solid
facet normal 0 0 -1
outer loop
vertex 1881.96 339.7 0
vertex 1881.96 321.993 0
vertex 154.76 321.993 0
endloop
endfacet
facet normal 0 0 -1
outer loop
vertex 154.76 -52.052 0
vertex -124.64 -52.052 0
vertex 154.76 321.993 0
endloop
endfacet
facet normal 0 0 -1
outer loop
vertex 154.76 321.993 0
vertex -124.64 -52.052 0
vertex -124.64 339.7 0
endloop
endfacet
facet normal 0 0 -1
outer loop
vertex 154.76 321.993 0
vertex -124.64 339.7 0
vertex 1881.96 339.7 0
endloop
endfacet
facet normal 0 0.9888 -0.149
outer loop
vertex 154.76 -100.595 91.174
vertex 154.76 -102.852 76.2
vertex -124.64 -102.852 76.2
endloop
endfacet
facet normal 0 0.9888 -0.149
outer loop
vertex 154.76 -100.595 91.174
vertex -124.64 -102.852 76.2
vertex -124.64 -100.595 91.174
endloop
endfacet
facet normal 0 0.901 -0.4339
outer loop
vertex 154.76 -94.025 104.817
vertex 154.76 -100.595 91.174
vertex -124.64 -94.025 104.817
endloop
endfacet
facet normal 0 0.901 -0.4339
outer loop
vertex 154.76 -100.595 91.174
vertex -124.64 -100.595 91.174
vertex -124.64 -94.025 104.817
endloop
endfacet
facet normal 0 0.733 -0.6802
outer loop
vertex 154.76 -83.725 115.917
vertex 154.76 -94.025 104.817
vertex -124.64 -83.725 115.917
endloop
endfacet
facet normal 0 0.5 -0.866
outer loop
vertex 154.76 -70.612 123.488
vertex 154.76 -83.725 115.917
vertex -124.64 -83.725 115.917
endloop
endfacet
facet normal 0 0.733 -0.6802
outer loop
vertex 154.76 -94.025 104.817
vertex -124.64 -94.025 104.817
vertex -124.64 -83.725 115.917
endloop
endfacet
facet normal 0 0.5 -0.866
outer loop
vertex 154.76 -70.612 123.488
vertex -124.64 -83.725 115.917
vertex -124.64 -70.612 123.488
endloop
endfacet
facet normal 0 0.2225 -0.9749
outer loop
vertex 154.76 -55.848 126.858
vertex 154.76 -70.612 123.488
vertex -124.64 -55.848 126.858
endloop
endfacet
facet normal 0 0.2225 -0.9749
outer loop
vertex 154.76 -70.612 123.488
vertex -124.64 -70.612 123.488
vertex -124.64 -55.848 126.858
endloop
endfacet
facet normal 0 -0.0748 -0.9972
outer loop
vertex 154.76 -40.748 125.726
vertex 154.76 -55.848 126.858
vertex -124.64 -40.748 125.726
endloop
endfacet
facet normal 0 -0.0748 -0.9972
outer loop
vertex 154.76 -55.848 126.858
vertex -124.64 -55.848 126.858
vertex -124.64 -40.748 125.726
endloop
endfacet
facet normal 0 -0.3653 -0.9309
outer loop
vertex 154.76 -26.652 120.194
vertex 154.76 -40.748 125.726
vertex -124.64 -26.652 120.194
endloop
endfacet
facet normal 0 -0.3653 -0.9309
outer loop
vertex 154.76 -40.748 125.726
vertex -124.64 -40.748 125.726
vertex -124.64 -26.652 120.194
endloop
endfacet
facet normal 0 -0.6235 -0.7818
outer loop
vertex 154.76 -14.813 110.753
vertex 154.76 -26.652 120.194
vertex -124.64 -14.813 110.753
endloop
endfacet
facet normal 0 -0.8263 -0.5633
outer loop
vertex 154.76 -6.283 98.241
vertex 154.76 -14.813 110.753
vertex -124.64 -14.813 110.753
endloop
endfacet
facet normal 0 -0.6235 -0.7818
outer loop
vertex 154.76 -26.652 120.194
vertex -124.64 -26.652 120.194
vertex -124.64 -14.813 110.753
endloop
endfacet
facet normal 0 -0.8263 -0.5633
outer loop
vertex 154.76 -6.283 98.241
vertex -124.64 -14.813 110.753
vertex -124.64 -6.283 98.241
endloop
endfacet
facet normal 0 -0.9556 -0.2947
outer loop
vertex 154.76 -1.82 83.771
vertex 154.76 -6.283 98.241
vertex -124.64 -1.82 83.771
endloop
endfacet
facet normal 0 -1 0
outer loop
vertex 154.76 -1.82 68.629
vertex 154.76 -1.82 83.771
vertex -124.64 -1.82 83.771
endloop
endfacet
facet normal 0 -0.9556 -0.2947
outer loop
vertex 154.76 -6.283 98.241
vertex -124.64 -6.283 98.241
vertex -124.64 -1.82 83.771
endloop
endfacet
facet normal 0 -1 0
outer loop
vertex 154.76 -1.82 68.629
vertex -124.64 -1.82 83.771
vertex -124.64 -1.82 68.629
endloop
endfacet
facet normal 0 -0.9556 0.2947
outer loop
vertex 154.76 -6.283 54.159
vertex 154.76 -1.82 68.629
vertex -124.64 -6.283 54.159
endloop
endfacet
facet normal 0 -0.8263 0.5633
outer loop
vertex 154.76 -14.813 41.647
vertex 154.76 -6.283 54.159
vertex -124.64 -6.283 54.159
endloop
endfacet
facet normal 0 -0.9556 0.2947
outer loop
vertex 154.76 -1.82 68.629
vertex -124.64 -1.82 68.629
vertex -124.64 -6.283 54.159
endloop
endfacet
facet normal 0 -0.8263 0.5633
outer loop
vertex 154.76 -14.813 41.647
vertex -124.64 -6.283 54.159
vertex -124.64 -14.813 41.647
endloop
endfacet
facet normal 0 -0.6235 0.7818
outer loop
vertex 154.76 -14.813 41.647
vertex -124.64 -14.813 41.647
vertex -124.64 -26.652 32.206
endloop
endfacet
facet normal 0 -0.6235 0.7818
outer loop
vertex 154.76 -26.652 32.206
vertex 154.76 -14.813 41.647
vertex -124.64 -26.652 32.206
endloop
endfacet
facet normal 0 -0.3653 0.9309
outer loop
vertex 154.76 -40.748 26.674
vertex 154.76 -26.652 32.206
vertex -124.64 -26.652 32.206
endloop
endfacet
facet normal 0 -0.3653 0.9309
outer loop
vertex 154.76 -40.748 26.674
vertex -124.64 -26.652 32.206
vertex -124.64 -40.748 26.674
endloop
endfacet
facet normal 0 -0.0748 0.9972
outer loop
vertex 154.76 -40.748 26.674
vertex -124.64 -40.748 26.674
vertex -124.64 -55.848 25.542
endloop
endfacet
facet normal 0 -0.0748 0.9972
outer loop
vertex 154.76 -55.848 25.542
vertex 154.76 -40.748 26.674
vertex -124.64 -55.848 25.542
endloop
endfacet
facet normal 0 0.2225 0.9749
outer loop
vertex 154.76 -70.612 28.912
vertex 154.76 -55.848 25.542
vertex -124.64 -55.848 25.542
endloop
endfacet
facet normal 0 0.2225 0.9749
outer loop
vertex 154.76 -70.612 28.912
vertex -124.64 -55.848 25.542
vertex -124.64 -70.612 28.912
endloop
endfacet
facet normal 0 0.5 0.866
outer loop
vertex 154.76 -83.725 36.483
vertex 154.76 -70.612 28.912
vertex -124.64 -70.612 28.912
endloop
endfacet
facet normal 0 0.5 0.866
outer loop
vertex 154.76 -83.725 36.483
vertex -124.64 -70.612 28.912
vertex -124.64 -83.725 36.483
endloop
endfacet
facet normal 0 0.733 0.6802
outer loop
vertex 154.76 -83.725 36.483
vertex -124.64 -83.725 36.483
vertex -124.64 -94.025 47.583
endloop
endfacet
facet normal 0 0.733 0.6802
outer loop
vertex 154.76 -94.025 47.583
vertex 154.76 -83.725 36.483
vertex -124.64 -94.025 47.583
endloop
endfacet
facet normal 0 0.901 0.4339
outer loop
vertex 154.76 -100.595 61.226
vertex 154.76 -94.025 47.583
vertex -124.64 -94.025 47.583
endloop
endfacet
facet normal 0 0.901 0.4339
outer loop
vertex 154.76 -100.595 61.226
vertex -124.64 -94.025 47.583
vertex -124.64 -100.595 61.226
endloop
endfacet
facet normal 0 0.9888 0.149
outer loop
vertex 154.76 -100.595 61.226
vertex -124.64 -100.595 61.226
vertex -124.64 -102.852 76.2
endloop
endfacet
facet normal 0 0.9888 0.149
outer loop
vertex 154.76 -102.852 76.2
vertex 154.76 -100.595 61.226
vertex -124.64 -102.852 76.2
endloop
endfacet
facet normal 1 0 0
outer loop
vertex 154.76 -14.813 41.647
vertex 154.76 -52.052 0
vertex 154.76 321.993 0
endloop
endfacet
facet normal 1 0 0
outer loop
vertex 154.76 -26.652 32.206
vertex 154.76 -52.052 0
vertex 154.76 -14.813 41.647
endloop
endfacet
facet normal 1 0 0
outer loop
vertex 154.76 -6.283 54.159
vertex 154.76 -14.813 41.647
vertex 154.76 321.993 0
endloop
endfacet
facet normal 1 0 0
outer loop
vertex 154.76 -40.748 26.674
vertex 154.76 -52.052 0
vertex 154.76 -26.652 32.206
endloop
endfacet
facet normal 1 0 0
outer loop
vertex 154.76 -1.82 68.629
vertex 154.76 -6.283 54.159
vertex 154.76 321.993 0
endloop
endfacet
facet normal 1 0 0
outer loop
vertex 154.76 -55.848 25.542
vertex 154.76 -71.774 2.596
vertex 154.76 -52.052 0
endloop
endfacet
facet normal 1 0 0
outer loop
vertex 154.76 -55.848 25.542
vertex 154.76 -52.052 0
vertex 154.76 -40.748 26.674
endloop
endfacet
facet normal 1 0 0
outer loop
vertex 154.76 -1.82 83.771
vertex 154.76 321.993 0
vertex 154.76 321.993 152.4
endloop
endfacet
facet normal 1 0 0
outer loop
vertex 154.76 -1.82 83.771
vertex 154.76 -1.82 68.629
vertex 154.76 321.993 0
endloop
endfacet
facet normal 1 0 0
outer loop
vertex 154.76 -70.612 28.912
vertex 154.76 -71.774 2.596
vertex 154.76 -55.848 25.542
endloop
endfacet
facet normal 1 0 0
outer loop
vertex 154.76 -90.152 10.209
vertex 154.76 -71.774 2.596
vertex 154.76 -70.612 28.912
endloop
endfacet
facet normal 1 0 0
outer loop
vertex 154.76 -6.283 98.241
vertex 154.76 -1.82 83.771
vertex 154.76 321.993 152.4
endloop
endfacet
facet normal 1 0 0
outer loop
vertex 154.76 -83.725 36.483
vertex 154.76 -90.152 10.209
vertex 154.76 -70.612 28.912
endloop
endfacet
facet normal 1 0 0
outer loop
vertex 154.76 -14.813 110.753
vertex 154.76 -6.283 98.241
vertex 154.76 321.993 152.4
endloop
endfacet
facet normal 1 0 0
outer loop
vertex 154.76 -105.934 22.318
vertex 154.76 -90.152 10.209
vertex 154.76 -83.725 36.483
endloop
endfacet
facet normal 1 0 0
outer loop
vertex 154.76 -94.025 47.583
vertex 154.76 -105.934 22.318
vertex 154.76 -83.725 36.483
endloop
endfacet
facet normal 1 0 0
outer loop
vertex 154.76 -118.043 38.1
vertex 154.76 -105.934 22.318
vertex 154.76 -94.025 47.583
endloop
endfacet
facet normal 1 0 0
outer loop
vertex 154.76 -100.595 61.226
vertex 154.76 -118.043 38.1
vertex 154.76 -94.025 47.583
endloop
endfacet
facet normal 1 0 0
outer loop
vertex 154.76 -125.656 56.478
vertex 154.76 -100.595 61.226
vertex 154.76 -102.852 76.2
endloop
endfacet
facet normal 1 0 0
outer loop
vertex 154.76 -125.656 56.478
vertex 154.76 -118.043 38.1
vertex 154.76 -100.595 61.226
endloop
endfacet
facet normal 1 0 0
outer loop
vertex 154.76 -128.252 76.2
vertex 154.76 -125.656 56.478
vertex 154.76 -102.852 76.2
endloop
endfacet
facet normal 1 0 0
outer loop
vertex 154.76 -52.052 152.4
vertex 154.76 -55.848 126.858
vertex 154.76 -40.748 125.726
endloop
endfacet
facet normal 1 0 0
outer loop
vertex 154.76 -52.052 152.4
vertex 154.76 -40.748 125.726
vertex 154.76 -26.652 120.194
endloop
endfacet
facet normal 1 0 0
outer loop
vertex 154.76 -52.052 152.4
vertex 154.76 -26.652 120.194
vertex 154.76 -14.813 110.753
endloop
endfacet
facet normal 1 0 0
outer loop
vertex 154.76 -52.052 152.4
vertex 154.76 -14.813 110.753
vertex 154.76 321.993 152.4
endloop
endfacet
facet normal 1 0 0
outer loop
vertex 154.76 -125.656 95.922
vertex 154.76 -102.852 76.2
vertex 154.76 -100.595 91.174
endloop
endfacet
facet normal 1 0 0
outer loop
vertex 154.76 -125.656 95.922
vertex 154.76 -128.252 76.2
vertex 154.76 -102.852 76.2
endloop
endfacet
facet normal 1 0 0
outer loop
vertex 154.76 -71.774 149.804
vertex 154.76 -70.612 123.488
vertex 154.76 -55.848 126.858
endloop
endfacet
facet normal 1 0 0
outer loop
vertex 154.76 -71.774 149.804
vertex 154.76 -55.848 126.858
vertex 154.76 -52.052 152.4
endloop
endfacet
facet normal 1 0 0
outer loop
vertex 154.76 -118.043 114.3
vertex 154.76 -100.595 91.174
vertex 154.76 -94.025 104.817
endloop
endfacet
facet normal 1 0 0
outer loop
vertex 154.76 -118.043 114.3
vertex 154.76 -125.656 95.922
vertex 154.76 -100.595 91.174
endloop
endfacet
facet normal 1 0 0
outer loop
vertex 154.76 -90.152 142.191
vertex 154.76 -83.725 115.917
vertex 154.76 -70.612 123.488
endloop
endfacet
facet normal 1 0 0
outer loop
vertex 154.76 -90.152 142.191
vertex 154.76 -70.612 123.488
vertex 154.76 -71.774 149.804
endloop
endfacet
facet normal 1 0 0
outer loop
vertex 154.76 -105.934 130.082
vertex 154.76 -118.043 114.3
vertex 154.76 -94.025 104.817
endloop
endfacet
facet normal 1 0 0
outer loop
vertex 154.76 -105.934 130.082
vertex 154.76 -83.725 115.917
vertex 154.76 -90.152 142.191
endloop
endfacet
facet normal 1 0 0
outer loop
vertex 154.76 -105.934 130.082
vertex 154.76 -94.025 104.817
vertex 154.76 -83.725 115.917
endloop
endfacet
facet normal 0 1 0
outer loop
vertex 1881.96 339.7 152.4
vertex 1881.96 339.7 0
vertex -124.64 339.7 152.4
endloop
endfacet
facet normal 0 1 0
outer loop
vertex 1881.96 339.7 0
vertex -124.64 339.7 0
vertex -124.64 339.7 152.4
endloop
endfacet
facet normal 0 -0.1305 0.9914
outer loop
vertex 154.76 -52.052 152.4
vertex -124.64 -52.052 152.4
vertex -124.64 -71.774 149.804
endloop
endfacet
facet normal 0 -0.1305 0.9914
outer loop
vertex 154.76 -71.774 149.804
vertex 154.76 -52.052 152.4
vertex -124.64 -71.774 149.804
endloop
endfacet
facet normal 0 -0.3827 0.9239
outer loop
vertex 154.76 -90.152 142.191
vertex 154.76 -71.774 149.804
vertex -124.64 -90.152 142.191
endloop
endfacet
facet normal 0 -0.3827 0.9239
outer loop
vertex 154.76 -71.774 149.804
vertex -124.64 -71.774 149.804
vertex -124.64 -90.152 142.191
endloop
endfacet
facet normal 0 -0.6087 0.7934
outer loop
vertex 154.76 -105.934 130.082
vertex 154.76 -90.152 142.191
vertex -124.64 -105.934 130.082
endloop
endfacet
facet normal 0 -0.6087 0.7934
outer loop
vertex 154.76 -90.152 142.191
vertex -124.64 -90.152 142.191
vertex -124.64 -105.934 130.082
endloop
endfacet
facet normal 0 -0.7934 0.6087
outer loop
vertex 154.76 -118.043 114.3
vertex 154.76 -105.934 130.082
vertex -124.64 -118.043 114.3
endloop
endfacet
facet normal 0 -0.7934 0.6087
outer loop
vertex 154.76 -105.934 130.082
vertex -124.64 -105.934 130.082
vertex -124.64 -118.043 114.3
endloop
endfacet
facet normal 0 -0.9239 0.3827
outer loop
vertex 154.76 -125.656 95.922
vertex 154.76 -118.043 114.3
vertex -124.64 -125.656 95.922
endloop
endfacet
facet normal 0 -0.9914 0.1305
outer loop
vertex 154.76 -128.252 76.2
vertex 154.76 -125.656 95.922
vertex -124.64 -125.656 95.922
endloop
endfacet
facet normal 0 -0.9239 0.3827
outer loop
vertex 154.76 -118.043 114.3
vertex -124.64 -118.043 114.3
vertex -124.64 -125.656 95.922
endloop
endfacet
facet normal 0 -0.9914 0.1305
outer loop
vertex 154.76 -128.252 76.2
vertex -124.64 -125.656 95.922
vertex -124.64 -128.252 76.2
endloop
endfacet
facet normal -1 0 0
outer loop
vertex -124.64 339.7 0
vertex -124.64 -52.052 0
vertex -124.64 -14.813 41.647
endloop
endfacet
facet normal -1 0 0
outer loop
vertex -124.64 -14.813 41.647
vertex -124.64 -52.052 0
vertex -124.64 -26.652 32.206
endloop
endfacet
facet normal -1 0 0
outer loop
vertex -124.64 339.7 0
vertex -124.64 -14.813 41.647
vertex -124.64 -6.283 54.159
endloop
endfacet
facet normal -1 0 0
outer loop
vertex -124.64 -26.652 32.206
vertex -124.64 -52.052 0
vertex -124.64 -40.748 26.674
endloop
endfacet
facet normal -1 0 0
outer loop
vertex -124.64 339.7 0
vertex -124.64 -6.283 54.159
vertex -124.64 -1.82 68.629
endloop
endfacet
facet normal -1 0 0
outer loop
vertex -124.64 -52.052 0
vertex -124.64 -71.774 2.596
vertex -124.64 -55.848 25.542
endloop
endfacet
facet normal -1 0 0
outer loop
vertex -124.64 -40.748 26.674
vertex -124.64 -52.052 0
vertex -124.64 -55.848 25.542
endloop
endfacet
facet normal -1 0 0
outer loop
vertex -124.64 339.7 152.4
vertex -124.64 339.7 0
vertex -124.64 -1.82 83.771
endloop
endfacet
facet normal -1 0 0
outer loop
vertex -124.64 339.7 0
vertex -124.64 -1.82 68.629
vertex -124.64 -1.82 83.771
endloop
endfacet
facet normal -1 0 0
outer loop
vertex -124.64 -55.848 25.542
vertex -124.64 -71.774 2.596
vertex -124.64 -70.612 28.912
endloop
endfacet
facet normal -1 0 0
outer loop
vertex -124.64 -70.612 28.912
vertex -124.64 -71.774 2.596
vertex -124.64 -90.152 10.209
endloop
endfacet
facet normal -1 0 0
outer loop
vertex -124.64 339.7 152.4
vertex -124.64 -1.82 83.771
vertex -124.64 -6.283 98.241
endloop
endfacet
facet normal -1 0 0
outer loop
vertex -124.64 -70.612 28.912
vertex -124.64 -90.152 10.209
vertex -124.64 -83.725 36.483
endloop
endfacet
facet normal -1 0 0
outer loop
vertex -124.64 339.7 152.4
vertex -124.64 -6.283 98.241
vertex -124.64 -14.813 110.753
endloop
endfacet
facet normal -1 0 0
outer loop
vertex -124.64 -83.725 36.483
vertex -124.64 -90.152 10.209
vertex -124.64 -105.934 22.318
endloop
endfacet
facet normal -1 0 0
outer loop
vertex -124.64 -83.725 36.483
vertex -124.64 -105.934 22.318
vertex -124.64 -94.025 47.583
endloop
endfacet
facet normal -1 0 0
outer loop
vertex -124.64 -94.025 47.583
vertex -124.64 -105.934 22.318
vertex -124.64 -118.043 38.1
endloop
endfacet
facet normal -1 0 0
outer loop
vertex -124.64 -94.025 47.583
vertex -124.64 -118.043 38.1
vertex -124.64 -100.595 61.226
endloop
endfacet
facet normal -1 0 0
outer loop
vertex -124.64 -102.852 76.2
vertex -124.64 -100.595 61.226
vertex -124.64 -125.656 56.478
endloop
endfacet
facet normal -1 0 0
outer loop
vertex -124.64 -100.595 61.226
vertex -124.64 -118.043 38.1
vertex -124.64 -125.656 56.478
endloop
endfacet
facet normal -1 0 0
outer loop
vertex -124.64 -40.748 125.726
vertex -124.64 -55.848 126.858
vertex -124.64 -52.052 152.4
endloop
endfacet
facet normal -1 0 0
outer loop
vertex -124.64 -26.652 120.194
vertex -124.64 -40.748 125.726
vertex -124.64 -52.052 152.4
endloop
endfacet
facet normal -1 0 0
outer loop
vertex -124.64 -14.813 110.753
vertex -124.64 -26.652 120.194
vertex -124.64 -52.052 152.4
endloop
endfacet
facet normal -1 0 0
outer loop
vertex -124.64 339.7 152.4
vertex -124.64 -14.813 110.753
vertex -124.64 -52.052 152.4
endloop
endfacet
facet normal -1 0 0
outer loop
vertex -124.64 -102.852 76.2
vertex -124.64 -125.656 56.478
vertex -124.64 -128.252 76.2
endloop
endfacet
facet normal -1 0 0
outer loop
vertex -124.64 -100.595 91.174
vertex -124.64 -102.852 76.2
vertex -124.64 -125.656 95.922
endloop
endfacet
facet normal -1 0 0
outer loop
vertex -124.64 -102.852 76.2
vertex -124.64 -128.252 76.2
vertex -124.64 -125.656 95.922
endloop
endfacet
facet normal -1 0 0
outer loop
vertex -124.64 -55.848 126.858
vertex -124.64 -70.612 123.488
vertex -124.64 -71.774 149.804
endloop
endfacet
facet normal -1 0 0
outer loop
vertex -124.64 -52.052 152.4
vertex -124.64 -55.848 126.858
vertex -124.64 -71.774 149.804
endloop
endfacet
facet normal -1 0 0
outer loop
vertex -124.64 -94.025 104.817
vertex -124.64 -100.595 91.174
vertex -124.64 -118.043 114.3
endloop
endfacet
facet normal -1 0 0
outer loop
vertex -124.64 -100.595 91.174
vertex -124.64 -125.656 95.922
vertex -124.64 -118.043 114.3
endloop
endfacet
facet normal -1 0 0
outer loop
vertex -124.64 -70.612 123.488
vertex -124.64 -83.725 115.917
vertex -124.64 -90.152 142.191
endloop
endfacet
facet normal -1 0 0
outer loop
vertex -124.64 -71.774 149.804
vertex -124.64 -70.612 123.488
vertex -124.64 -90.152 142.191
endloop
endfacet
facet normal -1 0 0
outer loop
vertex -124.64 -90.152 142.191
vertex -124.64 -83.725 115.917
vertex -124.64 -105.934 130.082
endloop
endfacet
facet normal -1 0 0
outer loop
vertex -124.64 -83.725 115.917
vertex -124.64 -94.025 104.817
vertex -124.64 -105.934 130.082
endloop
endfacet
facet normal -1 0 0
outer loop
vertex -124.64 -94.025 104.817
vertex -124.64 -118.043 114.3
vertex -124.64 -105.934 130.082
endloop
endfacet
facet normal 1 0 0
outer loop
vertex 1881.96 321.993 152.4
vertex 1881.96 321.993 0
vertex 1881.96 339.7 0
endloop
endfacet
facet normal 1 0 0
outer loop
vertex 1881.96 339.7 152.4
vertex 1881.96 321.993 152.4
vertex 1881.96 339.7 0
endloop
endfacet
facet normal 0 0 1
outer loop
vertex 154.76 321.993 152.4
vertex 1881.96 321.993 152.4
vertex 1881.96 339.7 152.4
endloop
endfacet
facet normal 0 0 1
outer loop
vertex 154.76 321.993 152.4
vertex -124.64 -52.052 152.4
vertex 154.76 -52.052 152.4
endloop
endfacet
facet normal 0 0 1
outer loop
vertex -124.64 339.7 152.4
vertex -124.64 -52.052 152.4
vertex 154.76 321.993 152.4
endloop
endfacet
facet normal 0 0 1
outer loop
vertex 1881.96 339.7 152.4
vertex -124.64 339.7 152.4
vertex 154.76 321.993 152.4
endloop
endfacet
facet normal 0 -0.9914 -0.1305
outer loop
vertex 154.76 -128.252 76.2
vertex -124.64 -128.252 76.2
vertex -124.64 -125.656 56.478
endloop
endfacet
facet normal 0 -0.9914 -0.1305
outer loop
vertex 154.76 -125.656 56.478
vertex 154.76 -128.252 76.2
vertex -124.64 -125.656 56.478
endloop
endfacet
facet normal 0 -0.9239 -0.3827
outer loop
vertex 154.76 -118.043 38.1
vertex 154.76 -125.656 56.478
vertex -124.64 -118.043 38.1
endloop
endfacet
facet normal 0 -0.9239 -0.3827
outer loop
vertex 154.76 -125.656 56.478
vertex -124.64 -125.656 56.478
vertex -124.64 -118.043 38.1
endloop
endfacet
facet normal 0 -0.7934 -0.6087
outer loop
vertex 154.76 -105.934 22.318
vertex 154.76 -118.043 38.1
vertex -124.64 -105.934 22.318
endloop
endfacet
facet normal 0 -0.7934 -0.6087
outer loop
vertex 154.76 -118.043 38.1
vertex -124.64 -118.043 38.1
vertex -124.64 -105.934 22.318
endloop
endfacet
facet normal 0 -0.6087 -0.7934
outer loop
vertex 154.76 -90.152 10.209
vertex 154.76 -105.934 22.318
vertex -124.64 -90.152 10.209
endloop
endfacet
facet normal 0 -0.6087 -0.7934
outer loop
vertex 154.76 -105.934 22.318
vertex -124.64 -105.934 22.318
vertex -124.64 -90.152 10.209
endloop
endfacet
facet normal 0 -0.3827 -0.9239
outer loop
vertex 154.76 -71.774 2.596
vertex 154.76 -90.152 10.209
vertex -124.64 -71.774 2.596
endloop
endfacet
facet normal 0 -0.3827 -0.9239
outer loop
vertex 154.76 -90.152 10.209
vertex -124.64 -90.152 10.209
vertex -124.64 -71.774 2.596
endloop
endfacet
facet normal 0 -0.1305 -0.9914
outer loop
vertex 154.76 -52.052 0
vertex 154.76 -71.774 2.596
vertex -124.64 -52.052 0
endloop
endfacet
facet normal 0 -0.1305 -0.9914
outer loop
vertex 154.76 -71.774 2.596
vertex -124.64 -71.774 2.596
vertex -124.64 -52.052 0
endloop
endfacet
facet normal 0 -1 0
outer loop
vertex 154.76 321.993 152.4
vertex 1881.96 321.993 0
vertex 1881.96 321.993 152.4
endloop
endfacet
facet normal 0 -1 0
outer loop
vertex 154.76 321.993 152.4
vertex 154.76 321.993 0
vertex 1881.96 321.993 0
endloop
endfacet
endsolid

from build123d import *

# Parameters (mm, degrees)
F0_W      = 279.4
F0_H      = 330.2
F1_DEPTH  = 152.4
F3_D      = 101.6
F5_DEPTH  = 279.4
F7_DEPTH  = 137.7526689321
F8_W      = 17.7074246799
F8_H      = 152.4
F9_DEPTH  = 1397
F11_DEPTH = 330.2


with BuildPart() as f1:
    # F0 (on Top) → F1 (new body)
    with BuildSketch(Plane.XY):
        with Locations((15.0600075722, 36.8478087073)):
            Rectangle(F0_W, F0_H)
    extrude(amount=F1_DEPTH)

    # F3 (through all)
    with Locations(Plane.YZ.offset(154.7600075722)):
        with Locations((-52.0521912927, 76.2)):
            Hole(F3_D / 2)

    # F4 (on face) → F5 (cut)
    with BuildSketch(Plane(origin=(-124.6399924278, 0, 0), x_dir=(0, -1, 0), z_dir=(-1, 0, 0))):
        with BuildLine():
            ThreePointArc((128.2521912927, 76.2), (105.9337280192, 22.3184632736), (52.0521912927, 0))
            Line((52.0521912927, 0), (65.0011226535, 0))
            Line((65.0011226535, 0), (128.2521912927, 0))
            Line((128.2521912927, 0), (128.2521912927, 76.2))
        make_face()
        with BuildLine():
            ThreePointArc((52.0521912927, 152.4), (105.9337280192, 130.0815367264), (128.2521912927, 76.2))
            Line((128.2521912927, 76.2), (128.2521912927, 152.4))
            Line((128.2521912927, 152.4), (65.0011226535, 152.4))
            Line((65.0011226535, 152.4), (52.0521912927, 152.4))
        make_face()
    extrude(amount=-F5_DEPTH, mode=Mode.SUBTRACT)

    # F7 (add): a face of the model
    f7_faces = [f1.faces().sort_by_distance(p)[0] for p in [
        (15.0600075722, 201.9478087073, 76.2),
    ]]
    extrude(f7_faces, amount=F7_DEPTH)

    # F8 (on face) → F9 (join)
    with BuildSketch(Plane.YZ.offset(154.7600075722)):
        with Locations((330.8467652994, 76.2)):
            Rectangle(F8_W, F8_H)
    extrude(amount=F9_DEPTH)

    # F11 (add): a face of the model
    f11_faces = [f1.faces().sort_by_distance(p)[0] for p in [
        (1551.7600075722, 330.8467652994, 76.2),
    ]]
    extrude(f11_faces, amount=F11_DEPTH)


solid = f1.part
